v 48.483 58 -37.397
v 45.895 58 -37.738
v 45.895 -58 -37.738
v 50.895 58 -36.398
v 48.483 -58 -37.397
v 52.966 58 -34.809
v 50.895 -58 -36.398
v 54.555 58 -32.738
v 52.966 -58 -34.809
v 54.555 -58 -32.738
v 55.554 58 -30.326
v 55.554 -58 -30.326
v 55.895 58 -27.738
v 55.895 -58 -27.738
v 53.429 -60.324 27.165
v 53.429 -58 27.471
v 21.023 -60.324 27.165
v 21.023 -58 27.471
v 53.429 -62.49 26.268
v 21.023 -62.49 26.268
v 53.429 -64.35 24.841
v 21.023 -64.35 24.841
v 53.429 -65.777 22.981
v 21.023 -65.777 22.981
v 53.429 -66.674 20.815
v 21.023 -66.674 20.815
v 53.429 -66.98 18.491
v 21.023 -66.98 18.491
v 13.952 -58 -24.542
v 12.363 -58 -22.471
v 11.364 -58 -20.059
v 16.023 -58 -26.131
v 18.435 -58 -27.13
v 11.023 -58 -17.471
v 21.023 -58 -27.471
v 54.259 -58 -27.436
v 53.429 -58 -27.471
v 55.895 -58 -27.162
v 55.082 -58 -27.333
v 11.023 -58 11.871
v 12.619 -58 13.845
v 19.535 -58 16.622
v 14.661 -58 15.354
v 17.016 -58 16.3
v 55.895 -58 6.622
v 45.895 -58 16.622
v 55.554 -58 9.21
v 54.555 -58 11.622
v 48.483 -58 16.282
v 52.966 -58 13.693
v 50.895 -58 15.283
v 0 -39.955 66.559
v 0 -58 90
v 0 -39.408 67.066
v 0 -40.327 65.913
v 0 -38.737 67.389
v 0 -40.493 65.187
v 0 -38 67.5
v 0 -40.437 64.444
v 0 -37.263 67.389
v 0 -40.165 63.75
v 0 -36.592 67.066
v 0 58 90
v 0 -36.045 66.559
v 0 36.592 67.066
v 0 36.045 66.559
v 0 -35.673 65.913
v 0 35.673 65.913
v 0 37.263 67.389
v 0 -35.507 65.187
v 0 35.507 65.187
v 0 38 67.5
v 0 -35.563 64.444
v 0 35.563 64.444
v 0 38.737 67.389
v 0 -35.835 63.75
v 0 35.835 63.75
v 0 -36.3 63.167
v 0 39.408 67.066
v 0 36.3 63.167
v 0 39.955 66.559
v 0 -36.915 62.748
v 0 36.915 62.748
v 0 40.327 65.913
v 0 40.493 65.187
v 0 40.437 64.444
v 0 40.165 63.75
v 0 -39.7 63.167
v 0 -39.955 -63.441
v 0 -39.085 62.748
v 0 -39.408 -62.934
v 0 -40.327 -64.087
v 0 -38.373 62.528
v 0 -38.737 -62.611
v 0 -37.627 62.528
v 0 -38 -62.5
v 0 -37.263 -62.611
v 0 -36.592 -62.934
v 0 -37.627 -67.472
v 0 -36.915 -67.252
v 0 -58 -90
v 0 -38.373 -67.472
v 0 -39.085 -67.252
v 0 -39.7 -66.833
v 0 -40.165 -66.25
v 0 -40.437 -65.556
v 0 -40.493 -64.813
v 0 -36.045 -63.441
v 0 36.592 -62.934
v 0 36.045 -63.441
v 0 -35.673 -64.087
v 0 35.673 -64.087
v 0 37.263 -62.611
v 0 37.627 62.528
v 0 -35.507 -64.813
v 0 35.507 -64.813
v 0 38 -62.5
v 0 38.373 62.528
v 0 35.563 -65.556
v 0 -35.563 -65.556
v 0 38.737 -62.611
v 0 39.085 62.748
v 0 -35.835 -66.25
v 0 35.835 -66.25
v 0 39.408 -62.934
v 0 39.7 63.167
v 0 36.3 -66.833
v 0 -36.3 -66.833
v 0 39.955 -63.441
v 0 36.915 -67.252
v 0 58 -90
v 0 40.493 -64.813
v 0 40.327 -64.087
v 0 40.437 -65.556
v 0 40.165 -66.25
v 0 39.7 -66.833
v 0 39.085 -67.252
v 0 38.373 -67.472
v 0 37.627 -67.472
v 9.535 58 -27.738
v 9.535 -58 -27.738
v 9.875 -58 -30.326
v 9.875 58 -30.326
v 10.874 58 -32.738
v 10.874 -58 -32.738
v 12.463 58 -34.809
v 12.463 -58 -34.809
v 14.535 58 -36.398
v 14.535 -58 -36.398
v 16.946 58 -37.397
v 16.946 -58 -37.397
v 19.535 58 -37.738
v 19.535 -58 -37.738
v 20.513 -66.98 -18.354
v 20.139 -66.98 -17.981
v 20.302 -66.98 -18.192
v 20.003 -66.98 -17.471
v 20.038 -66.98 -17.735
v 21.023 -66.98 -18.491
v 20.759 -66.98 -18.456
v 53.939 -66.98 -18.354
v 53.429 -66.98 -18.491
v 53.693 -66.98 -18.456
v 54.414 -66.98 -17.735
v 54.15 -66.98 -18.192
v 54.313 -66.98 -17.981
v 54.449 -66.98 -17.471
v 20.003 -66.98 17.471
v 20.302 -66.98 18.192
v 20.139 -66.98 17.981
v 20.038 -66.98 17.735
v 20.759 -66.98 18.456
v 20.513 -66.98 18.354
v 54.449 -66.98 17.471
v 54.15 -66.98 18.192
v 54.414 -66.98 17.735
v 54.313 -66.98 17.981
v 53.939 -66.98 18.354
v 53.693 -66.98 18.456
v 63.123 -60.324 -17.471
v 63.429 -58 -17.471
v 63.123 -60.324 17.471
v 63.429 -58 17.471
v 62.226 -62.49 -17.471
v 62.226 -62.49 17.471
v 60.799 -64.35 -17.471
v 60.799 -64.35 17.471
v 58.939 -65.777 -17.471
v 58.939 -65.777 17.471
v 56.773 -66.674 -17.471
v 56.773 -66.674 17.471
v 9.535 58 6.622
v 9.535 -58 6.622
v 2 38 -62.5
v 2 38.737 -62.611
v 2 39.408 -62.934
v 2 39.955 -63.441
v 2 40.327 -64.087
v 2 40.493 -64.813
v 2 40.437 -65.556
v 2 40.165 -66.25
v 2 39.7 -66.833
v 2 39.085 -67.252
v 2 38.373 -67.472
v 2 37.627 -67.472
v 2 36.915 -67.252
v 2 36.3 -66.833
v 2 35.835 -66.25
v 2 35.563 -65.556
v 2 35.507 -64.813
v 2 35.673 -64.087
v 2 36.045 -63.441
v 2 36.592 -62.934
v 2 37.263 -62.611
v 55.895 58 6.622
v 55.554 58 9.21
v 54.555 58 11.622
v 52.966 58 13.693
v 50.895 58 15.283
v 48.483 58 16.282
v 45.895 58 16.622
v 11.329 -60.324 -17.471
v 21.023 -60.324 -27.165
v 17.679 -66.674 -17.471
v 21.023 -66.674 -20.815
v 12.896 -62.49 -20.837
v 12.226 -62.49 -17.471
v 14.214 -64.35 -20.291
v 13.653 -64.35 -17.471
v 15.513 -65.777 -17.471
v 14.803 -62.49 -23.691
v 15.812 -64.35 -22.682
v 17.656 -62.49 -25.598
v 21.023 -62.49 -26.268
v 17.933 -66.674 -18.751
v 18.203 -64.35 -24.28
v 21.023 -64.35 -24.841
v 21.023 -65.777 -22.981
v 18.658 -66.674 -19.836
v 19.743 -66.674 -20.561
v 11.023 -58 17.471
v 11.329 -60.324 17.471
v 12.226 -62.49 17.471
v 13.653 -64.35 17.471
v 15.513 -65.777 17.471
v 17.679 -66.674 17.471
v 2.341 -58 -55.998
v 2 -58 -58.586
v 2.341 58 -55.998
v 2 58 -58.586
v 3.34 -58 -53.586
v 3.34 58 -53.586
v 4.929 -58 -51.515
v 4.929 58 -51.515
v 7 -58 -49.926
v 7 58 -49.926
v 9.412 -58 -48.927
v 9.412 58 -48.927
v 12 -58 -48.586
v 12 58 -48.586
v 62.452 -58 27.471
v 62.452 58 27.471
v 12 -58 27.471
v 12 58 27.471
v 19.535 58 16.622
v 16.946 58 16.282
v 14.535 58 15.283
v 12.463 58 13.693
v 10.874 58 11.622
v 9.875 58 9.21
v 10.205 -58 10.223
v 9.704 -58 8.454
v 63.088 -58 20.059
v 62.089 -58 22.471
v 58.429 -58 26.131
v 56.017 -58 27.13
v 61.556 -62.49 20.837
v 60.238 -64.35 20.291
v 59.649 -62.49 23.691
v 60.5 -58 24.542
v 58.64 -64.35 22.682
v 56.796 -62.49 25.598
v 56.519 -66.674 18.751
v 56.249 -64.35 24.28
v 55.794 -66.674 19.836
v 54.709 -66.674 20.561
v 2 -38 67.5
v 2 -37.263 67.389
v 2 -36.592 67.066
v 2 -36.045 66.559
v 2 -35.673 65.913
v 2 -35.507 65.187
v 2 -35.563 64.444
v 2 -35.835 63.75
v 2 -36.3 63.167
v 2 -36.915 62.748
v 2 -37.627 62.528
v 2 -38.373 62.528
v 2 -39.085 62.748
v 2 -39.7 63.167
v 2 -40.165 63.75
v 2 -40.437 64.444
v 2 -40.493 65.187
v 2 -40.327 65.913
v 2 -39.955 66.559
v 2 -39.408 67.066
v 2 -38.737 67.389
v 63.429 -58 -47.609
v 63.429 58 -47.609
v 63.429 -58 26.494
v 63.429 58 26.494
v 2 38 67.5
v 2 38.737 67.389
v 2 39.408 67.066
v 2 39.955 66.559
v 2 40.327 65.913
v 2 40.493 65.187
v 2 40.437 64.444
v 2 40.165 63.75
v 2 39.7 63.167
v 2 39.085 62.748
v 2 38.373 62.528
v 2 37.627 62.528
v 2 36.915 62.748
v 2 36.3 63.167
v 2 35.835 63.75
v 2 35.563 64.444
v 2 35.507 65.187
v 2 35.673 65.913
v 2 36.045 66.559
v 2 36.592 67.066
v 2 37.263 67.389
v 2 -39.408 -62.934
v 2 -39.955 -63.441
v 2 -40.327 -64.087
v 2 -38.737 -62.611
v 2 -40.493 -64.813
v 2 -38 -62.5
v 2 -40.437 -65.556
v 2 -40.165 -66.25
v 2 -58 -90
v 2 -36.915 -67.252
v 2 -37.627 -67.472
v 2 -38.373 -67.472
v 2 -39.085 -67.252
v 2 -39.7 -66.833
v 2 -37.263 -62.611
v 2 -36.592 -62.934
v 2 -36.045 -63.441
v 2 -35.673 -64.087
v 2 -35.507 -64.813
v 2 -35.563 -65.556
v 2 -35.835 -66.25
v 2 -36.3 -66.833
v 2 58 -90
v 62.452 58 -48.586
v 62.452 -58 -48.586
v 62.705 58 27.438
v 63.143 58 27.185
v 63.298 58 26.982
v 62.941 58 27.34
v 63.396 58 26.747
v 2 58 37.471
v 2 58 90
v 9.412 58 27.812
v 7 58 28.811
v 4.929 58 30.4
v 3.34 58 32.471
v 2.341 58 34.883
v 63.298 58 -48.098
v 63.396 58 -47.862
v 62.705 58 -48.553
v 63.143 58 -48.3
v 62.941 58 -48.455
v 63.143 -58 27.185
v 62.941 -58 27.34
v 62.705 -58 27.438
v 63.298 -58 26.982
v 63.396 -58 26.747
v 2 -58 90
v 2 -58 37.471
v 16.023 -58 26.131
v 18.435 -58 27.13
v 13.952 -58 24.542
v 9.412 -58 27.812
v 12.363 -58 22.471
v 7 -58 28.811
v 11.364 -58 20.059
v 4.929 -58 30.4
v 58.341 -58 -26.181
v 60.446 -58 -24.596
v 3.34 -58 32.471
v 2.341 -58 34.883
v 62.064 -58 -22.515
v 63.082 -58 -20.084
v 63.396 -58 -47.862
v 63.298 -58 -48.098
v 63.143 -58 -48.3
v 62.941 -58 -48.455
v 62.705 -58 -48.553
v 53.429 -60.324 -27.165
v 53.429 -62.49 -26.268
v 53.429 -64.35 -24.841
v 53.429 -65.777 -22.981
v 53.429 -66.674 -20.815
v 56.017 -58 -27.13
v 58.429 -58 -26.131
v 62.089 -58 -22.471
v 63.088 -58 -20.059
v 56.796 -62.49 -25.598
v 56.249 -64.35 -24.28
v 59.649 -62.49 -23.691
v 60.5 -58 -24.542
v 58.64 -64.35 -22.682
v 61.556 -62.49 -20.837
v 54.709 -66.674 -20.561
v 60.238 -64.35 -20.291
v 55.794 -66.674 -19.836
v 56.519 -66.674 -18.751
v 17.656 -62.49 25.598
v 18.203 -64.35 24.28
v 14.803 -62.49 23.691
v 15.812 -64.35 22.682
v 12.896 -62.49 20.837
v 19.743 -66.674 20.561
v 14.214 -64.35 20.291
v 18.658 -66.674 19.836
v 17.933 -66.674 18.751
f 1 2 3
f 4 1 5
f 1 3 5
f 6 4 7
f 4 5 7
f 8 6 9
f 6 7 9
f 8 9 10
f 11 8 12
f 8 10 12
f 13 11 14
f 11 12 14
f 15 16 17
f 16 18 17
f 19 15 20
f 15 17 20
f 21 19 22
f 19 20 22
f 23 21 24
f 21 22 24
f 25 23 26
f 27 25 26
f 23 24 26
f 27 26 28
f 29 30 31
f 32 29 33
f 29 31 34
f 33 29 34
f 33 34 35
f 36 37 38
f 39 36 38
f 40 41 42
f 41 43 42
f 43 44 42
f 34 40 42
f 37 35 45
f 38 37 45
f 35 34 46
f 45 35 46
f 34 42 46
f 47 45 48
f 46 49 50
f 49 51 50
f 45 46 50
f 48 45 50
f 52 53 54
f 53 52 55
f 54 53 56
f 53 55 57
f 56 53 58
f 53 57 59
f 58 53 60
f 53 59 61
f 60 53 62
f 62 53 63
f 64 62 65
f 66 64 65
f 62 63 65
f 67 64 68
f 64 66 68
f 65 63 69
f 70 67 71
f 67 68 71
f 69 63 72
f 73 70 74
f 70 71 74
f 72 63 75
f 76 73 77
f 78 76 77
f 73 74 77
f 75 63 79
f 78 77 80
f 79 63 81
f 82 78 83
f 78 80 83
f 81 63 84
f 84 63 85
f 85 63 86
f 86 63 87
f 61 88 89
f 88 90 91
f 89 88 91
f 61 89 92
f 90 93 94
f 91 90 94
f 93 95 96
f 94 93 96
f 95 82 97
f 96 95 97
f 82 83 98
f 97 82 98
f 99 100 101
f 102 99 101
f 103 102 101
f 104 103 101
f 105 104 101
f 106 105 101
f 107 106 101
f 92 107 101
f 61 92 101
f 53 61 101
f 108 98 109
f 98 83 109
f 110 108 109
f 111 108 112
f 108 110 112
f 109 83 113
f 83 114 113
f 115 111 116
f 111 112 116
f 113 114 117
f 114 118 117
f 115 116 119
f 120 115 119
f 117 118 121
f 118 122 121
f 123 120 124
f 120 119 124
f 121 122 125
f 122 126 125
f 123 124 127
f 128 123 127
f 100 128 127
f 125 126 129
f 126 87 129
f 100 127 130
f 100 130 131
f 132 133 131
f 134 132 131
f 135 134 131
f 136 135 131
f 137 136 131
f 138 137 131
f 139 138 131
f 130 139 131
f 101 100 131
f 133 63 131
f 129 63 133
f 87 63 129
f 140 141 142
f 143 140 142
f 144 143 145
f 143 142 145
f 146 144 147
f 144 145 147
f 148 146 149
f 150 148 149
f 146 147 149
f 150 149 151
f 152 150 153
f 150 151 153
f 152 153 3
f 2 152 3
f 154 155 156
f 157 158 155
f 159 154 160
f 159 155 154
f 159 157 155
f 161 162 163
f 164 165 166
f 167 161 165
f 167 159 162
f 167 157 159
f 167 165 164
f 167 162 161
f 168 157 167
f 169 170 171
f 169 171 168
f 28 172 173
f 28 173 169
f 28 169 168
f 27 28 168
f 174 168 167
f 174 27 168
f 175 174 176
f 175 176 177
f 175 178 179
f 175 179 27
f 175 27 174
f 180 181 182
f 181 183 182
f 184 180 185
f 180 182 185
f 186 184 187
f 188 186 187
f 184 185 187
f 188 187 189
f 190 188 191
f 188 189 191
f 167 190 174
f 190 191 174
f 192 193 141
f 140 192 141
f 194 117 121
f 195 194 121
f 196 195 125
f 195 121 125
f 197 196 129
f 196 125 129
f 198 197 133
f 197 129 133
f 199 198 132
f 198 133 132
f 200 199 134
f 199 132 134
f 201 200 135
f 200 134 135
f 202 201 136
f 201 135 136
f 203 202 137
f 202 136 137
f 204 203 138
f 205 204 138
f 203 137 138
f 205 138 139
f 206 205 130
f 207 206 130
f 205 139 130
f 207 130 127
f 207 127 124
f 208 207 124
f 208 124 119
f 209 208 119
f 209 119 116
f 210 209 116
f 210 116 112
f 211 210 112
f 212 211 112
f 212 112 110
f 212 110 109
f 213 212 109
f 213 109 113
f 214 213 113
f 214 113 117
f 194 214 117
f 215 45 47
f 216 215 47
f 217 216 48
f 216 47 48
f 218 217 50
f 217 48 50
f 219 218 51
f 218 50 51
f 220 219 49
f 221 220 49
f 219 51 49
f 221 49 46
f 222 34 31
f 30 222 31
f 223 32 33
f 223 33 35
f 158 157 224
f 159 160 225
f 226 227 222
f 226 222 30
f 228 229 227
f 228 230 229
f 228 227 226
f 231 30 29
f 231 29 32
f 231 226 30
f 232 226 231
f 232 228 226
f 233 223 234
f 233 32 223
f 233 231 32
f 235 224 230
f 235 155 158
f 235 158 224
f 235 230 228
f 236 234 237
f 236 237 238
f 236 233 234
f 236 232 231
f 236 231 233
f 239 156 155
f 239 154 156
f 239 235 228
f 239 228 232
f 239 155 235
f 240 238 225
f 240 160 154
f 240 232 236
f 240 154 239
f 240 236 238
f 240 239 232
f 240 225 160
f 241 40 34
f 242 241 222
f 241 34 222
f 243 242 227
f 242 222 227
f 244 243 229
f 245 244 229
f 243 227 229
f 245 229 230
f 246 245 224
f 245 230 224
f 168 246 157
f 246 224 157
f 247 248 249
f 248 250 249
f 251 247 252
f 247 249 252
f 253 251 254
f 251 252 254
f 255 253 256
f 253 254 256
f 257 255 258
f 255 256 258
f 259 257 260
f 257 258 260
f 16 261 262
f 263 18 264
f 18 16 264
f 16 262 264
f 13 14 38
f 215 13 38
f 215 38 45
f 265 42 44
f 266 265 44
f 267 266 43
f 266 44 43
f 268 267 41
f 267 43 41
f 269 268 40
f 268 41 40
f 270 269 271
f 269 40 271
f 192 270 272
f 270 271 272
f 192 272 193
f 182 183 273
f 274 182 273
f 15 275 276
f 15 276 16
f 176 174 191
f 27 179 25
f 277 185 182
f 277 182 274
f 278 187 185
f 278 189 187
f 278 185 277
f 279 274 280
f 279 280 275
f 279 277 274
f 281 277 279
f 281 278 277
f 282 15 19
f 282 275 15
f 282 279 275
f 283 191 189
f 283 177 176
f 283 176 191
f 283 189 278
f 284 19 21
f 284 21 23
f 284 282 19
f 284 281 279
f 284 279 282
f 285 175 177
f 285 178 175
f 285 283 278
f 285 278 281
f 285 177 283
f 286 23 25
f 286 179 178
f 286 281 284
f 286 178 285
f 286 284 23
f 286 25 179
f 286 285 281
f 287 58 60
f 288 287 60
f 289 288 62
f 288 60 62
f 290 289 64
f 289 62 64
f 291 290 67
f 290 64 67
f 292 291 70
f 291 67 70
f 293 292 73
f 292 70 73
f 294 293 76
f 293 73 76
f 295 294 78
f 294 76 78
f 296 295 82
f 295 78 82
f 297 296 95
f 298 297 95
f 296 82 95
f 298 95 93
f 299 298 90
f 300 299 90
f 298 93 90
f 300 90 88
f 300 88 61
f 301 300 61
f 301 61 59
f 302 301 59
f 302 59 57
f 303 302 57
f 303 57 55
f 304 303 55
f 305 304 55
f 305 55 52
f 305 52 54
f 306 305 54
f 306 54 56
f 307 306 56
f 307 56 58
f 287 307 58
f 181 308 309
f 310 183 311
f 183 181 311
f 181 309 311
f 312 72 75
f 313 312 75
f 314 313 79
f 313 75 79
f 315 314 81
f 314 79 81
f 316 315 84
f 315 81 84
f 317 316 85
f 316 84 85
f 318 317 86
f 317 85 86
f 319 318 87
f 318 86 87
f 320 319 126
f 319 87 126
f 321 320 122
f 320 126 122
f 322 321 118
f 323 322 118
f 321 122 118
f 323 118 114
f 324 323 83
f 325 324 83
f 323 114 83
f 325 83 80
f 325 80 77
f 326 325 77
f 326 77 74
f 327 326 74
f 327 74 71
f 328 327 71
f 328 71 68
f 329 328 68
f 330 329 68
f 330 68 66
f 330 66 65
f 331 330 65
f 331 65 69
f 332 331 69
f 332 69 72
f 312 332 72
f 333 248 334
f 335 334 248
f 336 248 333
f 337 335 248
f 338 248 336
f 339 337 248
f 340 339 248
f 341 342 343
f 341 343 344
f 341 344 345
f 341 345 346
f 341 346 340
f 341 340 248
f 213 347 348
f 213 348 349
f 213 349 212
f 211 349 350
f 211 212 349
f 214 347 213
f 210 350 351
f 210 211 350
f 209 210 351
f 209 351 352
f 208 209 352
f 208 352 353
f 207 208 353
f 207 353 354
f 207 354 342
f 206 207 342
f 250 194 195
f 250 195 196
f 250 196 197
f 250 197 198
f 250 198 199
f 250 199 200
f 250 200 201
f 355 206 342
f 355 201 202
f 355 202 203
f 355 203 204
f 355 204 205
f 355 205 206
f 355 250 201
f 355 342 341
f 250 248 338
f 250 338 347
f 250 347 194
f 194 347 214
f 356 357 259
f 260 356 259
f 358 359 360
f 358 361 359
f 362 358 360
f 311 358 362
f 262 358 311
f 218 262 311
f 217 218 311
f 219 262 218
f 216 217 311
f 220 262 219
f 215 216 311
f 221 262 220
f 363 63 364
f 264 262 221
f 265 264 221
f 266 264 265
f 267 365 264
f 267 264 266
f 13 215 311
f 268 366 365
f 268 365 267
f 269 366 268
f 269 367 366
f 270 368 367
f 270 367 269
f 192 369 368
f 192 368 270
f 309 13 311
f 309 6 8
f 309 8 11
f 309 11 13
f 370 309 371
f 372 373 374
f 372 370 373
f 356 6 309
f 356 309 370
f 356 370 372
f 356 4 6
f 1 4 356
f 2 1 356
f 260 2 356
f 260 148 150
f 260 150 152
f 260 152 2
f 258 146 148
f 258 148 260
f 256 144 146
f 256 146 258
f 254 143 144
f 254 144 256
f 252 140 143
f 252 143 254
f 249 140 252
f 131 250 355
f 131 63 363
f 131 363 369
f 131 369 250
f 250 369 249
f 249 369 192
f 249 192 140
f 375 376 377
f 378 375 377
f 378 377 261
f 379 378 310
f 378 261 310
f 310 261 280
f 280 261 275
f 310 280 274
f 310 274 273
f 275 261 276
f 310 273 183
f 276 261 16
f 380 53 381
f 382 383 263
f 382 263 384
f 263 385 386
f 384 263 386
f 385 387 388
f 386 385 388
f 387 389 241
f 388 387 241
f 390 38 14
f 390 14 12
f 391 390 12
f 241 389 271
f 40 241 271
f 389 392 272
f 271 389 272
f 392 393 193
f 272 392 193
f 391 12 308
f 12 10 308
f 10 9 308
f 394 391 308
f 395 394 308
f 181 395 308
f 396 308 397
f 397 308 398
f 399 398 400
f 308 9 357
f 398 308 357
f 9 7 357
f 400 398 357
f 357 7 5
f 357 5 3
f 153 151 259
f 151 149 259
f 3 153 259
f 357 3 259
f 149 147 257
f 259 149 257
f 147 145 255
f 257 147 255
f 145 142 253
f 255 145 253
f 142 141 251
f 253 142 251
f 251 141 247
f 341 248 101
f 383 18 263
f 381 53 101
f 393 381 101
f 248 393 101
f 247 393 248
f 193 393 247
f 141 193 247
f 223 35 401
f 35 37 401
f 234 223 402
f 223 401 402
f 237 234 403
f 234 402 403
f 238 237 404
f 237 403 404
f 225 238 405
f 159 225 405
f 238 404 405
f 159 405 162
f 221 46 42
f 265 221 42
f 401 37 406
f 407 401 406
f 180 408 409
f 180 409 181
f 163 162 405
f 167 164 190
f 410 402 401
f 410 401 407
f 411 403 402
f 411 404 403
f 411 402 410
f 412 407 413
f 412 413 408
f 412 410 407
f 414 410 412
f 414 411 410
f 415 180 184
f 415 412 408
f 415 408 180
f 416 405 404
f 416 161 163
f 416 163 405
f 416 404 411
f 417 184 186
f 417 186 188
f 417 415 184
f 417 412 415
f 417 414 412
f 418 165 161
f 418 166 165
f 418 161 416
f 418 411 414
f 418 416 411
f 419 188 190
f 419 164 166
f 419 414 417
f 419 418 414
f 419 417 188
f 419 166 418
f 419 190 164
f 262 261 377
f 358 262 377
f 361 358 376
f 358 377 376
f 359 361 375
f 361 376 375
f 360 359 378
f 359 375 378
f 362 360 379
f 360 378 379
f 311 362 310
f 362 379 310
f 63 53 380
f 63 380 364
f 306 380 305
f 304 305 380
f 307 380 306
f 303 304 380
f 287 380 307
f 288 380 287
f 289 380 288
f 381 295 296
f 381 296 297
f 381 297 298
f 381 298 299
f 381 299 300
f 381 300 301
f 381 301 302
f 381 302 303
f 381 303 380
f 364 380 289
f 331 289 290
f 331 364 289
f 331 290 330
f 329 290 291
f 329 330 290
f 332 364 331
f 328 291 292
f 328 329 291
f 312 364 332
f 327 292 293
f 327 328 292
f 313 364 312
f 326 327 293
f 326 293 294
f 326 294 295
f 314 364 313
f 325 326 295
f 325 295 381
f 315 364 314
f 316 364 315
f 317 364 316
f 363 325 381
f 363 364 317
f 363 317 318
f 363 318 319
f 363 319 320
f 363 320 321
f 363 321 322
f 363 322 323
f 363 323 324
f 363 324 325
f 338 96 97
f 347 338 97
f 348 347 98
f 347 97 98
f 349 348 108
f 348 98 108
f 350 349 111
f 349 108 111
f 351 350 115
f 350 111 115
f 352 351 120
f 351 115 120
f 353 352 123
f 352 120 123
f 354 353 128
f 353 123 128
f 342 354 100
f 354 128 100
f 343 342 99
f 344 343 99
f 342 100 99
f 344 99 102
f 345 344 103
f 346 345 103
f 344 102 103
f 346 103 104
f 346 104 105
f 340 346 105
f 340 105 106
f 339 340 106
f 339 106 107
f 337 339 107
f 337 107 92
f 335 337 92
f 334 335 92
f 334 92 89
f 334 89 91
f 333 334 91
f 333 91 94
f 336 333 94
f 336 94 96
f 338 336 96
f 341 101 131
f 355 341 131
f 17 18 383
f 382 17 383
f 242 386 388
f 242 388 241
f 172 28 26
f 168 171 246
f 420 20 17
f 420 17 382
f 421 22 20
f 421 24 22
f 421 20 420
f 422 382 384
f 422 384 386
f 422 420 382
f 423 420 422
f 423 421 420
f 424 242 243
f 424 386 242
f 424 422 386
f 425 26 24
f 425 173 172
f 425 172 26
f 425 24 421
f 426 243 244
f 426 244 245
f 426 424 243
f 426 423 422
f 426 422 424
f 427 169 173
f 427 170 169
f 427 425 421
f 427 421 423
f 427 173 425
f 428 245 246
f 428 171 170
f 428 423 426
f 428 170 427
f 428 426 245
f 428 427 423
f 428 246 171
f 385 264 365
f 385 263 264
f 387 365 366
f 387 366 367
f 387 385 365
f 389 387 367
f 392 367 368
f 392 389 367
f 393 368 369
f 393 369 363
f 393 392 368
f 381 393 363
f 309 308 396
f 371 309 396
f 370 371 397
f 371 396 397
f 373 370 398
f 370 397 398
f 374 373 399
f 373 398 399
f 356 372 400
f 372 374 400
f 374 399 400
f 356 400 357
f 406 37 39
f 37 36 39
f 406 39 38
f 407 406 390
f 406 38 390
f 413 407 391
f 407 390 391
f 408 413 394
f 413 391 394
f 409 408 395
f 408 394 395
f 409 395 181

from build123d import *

# Parameters (mm, degrees)
SKETCH1_W                       = 180
SKETCH1_H                       = 116
BOSS_EXTRUDE1_DEPTH             = 2
BOSS_EXTRUDE6_REACH             = 109.089
BOSS_EXTRUDE6_DIRECTION_2_REACH = 109.089
FILLET5_R                       = 10
BOSS_EXTRUDE8_DEPTH             = 8.98
FILLET7_R                       = 8.98
M6X1_0_TAPPED_HOLE1_D           = 5


with BuildPart() as part:
    # Sketch1 → Boss-Extrude1 (new body)
    with BuildSketch(Plane(origin=(0, 0, 0), x_dir=(0, 0, -1), z_dir=(1, 0, 0))):
        Rectangle(SKETCH1_W, SKETCH1_H)
    extrude(amount=BOSS_EXTRUDE1_DEPTH)

    # Boss-Extrude6: up to this face of the body (flat: up to its plane)
    boss_extrude6_end = Plane(part.part.faces().sort_by_distance((1, -58, 0))[0])
    # Sketch9 → Boss-Extrude6 (add, up to the picked face)
    with BuildSketch(Plane(origin=(0, 0, 0), x_dir=(1, 0, 0), z_dir=(0, 1, 0)), mode=Mode.PRIVATE) as boss_extrude6_sk1:
        with BuildLine():
            Line((2, -27.470907931), (20, -27.470907931))
            Line((20, -27.470907931), (62.451993428, -27.470907931))
            ThreePointArc((62.451993428, -27.470907931), (63.142907445, -27.184721975), (63.429093401, -26.493807958))
            Line((63.429093401, -26.493807958), (63.429093401, 47.609249241))
            ThreePointArc((63.429093401, 47.609249241), (63.142907445, 48.300163258), (62.451993428, 48.586349214))
            Line((62.451993428, 48.586349214), (20, 48.586349214))
            Line((20, 48.586349214), (2, 48.586349214))
            Line((2, 48.586349214), (2, 27.673016612))
            Line((2, 27.673016612), (2, -27.470907931))
        make_face()
        with BuildLine():
            Line((45.894546701, -16.622279359), (19.534546701, -16.622279359))
            ThreePointArc((19.534546701, -16.622279359), (12.463478889, -13.693347171), (9.534546701, -6.622279359))
            Line((9.534546701, -6.622279359), (9.534546701, 27.737720641))
            ThreePointArc((9.534546701, 27.737720641), (12.463478889, 34.808788453), (19.534546701, 37.737720641))
            Line((19.534546701, 37.737720641), (45.894546701, 37.737720641))
            ThreePointArc((45.894546701, 37.737720641), (52.965614513, 34.808788453), (55.894546701, 27.737720641))
            Line((55.894546701, 27.737720641), (55.894546701, -6.622279359))
            ThreePointArc((55.894546701, -6.622279359), (52.965614513, -13.693347171), (45.894546701, -16.622279359))
        make_face(mode=Mode.SUBTRACT)
    boss_extrude6_tool1 = split(extrude(boss_extrude6_sk1.sketch, amount=-BOSS_EXTRUDE6_REACH, mode=Mode.PRIVATE), bisect_by=boss_extrude6_end, keep=Keep.BOTH, mode=Mode.PRIVATE)
    add(boss_extrude6_tool1.solids().sort_by(Axis((11, 0, 26.493245), (0, -1, 0)))[0])

    # Boss-Extrude6 direction 2: up to this face of the body (flat: up to its plane)
    boss_extrude6_direction_2_end = Plane(part.part.faces().sort_by_distance((1, 58, 0))[0])
    # Sketch9 → Boss-Extrude6 direction 2 (add, up to the picked face)
    with BuildSketch(Plane(origin=(0, 0, 0), x_dir=(1, 0, 0), z_dir=(0, 1, 0)), mode=Mode.PRIVATE) as boss_extrude6_direction_2_sk1:
        with BuildLine():
            Line((2, -27.470907931), (20, -27.470907931))
            Line((20, -27.470907931), (62.451993428, -27.470907931))
            ThreePointArc((62.451993428, -27.470907931), (63.142907445, -27.184721975), (63.429093401, -26.493807958))
            Line((63.429093401, -26.493807958), (63.429093401, 47.609249241))
            ThreePointArc((63.429093401, 47.609249241), (63.142907445, 48.300163258), (62.451993428, 48.586349214))
            Line((62.451993428, 48.586349214), (20, 48.586349214))
            Line((20, 48.586349214), (2, 48.586349214))
            Line((2, 48.586349214), (2, 27.673016612))
            Line((2, 27.673016612), (2, -27.470907931))
        make_face()
        with BuildLine():
            Line((45.894546701, -16.622279359), (19.534546701, -16.622279359))
            ThreePointArc((19.534546701, -16.622279359), (12.463478889, -13.693347171), (9.534546701, -6.622279359))
            Line((9.534546701, -6.622279359), (9.534546701, 27.737720641))
            ThreePointArc((9.534546701, 27.737720641), (12.463478889, 34.808788453), (19.534546701, 37.737720641))
            Line((19.534546701, 37.737720641), (45.894546701, 37.737720641))
            ThreePointArc((45.894546701, 37.737720641), (52.965614513, 34.808788453), (55.894546701, 27.737720641))
            Line((55.894546701, 27.737720641), (55.894546701, -6.622279359))
            ThreePointArc((55.894546701, -6.622279359), (52.965614513, -13.693347171), (45.894546701, -16.622279359))
        make_face(mode=Mode.SUBTRACT)
    boss_extrude6_direction_2_tool1 = split(extrude(boss_extrude6_direction_2_sk1.sketch, amount=BOSS_EXTRUDE6_DIRECTION_2_REACH, mode=Mode.PRIVATE), bisect_by=boss_extrude6_direction_2_end, keep=Keep.BOTH, mode=Mode.PRIVATE)
    add(boss_extrude6_direction_2_tool1.solids().sort_by(Axis((11, 0, 26.493245), (0, 1, 0)))[0])

    # Fillet5
    fillet5_edges = [part.edges().sort_by_distance(p)[0] for p in [
        (2, 0, 27.470907931),
        (2, 0, -48.586349214),
    ]]
    fillet(fillet5_edges, radius=FILLET5_R)

    # Sketch11 → Boss-Extrude8 (add)
    with BuildSketch(Plane.XZ.offset(58)):
        with BuildLine():
            Line((21.022900027, -27.470907931), (53.429093401, -27.470907931))
            ThreePointArc((53.429093401, -27.470907931), (60.500161213, -24.541975743), (63.429093401, -17.470907931))
            Line((63.429093401, -17.470907931), (63.429093401, 17.470907931))
            ThreePointArc((63.429093401, 17.470907931), (60.500161213, 24.541975743), (53.429093401, 27.470907931))
            Line((53.429093401, 27.470907931), (21.022900027, 27.470907931))
            ThreePointArc((21.022900027, 27.470907931), (13.951832215, 24.541975743), (11.022900027, 17.470907931))
            Line((11.022900027, 17.470907931), (11.022900027, -17.470907931))
            ThreePointArc((11.022900027, -17.470907931), (13.951832215, -24.541975743), (21.022900027, -27.470907931))
        make_face()
    extrude(amount=BOSS_EXTRUDE8_DEPTH)

    # Fillet7
    fillet7_edges = [part.edges().sort_by_distance(p)[0] for p in [
        (60.500161213, -66.98, -24.541975743),
        (37.225996714, -66.98, -27.470907931),
        (13.951832215, -66.98, -24.541975743),
        (11.022900027, -66.98, 0),
        (13.951832215, -66.98, 24.541975743),
        (63.429093401, -66.98, 0),
        (60.500161213, -66.98, 24.541975743),
        (37.225996714, -66.98, 27.470907931),
    ]]
    fillet(fillet7_edges, radius=FILLET7_R - 0.0001)  # a hair under: the kernel refuses the full size

    # M6x1.0 Tapped Hole1 (through all)
    with Locations(Plane(origin=(2, 0, 0), x_dir=(0, 0, -1), z_dir=(1, 0, 0))):
        with Locations((-65, 38), (-65, -38), (65, -38), (65, 38)):
            Hole(M6X1_0_TAPPED_HOLE1_D / 2)


solid = part.part
